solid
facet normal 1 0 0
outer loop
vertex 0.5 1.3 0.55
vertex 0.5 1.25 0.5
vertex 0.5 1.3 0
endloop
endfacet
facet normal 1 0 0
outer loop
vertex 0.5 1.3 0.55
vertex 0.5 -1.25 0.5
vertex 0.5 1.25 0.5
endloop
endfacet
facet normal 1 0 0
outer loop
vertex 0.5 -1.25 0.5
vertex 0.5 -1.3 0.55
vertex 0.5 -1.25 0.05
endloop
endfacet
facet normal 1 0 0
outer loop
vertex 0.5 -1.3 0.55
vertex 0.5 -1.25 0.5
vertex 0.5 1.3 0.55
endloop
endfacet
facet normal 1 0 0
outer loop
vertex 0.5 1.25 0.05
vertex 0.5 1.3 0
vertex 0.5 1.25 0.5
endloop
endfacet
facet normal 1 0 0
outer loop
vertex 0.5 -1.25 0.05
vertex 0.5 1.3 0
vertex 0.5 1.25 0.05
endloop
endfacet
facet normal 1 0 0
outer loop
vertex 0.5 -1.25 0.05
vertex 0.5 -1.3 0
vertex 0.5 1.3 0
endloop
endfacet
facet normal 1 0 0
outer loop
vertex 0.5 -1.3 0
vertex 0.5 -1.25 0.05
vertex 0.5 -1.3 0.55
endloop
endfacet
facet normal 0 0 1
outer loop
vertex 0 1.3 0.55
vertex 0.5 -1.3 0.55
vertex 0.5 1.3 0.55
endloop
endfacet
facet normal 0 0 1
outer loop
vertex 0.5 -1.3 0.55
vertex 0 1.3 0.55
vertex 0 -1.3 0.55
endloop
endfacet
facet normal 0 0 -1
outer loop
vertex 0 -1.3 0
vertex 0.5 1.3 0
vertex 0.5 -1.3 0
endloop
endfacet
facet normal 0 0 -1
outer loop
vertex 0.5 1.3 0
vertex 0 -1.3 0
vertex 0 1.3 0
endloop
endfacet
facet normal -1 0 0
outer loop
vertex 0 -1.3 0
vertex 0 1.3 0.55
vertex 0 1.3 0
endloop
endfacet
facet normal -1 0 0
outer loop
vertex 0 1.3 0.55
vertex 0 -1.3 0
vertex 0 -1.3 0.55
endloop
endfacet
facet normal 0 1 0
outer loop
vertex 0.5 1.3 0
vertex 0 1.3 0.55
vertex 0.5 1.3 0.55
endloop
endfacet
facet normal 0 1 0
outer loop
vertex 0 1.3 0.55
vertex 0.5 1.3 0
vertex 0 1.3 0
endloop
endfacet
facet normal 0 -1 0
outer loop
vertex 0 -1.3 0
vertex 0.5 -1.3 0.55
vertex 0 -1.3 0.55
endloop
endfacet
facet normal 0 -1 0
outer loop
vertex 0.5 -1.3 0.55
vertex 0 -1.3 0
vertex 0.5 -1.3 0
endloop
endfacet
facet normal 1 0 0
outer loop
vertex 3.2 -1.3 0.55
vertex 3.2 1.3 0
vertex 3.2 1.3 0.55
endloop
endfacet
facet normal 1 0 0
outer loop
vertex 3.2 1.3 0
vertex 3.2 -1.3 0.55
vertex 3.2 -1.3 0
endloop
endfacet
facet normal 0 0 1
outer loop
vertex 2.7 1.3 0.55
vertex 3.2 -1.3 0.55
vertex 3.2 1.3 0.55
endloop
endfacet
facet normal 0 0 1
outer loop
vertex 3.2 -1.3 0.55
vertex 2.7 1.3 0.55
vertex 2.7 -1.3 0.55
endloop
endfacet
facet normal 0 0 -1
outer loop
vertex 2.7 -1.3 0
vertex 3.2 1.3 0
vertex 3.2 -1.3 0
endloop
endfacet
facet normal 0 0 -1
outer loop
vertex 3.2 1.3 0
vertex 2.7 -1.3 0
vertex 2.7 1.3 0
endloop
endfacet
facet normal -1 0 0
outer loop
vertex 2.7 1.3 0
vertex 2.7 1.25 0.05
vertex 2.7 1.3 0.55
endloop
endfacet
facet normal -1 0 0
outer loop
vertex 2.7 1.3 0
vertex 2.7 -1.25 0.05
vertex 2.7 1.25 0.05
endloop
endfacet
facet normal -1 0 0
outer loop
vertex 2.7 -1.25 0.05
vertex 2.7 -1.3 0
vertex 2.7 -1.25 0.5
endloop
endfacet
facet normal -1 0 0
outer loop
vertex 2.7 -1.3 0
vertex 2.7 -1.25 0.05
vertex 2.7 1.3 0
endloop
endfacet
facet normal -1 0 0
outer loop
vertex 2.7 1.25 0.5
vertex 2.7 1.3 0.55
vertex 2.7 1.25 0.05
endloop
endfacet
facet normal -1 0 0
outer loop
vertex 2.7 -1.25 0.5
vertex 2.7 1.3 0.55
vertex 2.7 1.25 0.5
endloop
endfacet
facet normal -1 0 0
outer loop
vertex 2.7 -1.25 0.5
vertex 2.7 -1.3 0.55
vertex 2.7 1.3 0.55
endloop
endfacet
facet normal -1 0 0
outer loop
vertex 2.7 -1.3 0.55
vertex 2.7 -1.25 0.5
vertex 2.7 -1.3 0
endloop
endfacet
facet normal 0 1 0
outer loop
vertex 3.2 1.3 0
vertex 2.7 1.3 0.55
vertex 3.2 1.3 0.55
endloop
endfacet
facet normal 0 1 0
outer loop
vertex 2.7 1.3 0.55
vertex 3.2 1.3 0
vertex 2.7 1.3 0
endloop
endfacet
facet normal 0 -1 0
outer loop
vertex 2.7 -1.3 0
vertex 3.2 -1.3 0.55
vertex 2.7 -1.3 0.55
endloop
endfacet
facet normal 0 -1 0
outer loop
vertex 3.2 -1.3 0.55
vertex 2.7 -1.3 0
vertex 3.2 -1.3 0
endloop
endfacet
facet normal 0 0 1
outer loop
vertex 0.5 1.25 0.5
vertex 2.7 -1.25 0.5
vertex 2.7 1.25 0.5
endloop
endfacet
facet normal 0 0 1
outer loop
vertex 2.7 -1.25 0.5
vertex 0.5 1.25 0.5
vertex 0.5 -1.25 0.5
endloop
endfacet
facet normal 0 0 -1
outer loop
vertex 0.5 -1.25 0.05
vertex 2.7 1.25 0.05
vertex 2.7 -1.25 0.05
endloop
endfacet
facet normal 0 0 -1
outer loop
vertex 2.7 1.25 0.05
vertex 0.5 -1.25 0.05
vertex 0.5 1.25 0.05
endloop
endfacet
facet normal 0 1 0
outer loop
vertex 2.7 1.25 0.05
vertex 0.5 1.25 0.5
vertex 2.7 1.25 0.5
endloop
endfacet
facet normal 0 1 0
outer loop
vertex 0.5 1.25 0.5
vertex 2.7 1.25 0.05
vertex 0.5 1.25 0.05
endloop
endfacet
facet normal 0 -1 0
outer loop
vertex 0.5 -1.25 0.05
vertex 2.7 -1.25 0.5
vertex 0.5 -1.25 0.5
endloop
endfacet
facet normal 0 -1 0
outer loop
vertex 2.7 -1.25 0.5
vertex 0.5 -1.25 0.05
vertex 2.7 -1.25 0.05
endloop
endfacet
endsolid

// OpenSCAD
// Can be 00105,0201,0402,0603,0805,1206,1210,2010 or 2512
type="1210";

th = 0.05;

th = type=="00105" ? 0.02:
    type=="0201" ? 0.03:
    type=="0402" ? 0.04: 0.05;

L = type=="00105" ? 0.4:
    type=="0201" ? 0.6:
    type=="0402" ? 1.0:
    type=="0603" ? 1.6:
    type=="0805" ? 2.0 :
	type=="1206" ? 3.1:
	type=="1210" ? 3.2:
	type=="2010" ? 5.0:
	type=="2512" ? 6.35: 0;

W = type=="00105" ? 0.2:
    type=="0201" ? 0.3:
    type=="0402" ? 0.5:
    type=="0603" ? 0.8:
    type=="0805" ? 1.25 :
	type=="1206" ? 1.55:
	type=="1210" ? 2.6:
	type=="2010" ? 2.5:
	type=="2512" ? 3.2: 0;

T = type=="00105" ? 0.13:
    type=="0201" ? 0.23:
    type=="0402" ? 0.35:
    type=="0603" ? 0.45:
    type=="0805" ? 0.5 :
	type=="1206" ? 0.55:
	type=="1210" ? 0.55:
	type=="2010" ? 0.55:
	type=="2512" ? 0.55: 0;

t = type=="00105" ? 0.1:
    type=="0201" ? 0.15:
    type=="0402" ? 0.25:
    type=="0603" ? 0.35:
    type=="0805" ? 0.5:
	type=="1206" ? 0.50:
	type=="1210" ? 0.50:
	type=="2010" ? 0.60:
	type=="2512" ? 0.60: 0;

union()
{
	translate([0,-W/2])
		cube([t,W,T]);
	translate([L-t,-W/2])
		cube([t,W,T]);

	translate([th,-(W-th*2)/2,th])
		cube([L-th*2,W-th*2,T-th*2]);
}
